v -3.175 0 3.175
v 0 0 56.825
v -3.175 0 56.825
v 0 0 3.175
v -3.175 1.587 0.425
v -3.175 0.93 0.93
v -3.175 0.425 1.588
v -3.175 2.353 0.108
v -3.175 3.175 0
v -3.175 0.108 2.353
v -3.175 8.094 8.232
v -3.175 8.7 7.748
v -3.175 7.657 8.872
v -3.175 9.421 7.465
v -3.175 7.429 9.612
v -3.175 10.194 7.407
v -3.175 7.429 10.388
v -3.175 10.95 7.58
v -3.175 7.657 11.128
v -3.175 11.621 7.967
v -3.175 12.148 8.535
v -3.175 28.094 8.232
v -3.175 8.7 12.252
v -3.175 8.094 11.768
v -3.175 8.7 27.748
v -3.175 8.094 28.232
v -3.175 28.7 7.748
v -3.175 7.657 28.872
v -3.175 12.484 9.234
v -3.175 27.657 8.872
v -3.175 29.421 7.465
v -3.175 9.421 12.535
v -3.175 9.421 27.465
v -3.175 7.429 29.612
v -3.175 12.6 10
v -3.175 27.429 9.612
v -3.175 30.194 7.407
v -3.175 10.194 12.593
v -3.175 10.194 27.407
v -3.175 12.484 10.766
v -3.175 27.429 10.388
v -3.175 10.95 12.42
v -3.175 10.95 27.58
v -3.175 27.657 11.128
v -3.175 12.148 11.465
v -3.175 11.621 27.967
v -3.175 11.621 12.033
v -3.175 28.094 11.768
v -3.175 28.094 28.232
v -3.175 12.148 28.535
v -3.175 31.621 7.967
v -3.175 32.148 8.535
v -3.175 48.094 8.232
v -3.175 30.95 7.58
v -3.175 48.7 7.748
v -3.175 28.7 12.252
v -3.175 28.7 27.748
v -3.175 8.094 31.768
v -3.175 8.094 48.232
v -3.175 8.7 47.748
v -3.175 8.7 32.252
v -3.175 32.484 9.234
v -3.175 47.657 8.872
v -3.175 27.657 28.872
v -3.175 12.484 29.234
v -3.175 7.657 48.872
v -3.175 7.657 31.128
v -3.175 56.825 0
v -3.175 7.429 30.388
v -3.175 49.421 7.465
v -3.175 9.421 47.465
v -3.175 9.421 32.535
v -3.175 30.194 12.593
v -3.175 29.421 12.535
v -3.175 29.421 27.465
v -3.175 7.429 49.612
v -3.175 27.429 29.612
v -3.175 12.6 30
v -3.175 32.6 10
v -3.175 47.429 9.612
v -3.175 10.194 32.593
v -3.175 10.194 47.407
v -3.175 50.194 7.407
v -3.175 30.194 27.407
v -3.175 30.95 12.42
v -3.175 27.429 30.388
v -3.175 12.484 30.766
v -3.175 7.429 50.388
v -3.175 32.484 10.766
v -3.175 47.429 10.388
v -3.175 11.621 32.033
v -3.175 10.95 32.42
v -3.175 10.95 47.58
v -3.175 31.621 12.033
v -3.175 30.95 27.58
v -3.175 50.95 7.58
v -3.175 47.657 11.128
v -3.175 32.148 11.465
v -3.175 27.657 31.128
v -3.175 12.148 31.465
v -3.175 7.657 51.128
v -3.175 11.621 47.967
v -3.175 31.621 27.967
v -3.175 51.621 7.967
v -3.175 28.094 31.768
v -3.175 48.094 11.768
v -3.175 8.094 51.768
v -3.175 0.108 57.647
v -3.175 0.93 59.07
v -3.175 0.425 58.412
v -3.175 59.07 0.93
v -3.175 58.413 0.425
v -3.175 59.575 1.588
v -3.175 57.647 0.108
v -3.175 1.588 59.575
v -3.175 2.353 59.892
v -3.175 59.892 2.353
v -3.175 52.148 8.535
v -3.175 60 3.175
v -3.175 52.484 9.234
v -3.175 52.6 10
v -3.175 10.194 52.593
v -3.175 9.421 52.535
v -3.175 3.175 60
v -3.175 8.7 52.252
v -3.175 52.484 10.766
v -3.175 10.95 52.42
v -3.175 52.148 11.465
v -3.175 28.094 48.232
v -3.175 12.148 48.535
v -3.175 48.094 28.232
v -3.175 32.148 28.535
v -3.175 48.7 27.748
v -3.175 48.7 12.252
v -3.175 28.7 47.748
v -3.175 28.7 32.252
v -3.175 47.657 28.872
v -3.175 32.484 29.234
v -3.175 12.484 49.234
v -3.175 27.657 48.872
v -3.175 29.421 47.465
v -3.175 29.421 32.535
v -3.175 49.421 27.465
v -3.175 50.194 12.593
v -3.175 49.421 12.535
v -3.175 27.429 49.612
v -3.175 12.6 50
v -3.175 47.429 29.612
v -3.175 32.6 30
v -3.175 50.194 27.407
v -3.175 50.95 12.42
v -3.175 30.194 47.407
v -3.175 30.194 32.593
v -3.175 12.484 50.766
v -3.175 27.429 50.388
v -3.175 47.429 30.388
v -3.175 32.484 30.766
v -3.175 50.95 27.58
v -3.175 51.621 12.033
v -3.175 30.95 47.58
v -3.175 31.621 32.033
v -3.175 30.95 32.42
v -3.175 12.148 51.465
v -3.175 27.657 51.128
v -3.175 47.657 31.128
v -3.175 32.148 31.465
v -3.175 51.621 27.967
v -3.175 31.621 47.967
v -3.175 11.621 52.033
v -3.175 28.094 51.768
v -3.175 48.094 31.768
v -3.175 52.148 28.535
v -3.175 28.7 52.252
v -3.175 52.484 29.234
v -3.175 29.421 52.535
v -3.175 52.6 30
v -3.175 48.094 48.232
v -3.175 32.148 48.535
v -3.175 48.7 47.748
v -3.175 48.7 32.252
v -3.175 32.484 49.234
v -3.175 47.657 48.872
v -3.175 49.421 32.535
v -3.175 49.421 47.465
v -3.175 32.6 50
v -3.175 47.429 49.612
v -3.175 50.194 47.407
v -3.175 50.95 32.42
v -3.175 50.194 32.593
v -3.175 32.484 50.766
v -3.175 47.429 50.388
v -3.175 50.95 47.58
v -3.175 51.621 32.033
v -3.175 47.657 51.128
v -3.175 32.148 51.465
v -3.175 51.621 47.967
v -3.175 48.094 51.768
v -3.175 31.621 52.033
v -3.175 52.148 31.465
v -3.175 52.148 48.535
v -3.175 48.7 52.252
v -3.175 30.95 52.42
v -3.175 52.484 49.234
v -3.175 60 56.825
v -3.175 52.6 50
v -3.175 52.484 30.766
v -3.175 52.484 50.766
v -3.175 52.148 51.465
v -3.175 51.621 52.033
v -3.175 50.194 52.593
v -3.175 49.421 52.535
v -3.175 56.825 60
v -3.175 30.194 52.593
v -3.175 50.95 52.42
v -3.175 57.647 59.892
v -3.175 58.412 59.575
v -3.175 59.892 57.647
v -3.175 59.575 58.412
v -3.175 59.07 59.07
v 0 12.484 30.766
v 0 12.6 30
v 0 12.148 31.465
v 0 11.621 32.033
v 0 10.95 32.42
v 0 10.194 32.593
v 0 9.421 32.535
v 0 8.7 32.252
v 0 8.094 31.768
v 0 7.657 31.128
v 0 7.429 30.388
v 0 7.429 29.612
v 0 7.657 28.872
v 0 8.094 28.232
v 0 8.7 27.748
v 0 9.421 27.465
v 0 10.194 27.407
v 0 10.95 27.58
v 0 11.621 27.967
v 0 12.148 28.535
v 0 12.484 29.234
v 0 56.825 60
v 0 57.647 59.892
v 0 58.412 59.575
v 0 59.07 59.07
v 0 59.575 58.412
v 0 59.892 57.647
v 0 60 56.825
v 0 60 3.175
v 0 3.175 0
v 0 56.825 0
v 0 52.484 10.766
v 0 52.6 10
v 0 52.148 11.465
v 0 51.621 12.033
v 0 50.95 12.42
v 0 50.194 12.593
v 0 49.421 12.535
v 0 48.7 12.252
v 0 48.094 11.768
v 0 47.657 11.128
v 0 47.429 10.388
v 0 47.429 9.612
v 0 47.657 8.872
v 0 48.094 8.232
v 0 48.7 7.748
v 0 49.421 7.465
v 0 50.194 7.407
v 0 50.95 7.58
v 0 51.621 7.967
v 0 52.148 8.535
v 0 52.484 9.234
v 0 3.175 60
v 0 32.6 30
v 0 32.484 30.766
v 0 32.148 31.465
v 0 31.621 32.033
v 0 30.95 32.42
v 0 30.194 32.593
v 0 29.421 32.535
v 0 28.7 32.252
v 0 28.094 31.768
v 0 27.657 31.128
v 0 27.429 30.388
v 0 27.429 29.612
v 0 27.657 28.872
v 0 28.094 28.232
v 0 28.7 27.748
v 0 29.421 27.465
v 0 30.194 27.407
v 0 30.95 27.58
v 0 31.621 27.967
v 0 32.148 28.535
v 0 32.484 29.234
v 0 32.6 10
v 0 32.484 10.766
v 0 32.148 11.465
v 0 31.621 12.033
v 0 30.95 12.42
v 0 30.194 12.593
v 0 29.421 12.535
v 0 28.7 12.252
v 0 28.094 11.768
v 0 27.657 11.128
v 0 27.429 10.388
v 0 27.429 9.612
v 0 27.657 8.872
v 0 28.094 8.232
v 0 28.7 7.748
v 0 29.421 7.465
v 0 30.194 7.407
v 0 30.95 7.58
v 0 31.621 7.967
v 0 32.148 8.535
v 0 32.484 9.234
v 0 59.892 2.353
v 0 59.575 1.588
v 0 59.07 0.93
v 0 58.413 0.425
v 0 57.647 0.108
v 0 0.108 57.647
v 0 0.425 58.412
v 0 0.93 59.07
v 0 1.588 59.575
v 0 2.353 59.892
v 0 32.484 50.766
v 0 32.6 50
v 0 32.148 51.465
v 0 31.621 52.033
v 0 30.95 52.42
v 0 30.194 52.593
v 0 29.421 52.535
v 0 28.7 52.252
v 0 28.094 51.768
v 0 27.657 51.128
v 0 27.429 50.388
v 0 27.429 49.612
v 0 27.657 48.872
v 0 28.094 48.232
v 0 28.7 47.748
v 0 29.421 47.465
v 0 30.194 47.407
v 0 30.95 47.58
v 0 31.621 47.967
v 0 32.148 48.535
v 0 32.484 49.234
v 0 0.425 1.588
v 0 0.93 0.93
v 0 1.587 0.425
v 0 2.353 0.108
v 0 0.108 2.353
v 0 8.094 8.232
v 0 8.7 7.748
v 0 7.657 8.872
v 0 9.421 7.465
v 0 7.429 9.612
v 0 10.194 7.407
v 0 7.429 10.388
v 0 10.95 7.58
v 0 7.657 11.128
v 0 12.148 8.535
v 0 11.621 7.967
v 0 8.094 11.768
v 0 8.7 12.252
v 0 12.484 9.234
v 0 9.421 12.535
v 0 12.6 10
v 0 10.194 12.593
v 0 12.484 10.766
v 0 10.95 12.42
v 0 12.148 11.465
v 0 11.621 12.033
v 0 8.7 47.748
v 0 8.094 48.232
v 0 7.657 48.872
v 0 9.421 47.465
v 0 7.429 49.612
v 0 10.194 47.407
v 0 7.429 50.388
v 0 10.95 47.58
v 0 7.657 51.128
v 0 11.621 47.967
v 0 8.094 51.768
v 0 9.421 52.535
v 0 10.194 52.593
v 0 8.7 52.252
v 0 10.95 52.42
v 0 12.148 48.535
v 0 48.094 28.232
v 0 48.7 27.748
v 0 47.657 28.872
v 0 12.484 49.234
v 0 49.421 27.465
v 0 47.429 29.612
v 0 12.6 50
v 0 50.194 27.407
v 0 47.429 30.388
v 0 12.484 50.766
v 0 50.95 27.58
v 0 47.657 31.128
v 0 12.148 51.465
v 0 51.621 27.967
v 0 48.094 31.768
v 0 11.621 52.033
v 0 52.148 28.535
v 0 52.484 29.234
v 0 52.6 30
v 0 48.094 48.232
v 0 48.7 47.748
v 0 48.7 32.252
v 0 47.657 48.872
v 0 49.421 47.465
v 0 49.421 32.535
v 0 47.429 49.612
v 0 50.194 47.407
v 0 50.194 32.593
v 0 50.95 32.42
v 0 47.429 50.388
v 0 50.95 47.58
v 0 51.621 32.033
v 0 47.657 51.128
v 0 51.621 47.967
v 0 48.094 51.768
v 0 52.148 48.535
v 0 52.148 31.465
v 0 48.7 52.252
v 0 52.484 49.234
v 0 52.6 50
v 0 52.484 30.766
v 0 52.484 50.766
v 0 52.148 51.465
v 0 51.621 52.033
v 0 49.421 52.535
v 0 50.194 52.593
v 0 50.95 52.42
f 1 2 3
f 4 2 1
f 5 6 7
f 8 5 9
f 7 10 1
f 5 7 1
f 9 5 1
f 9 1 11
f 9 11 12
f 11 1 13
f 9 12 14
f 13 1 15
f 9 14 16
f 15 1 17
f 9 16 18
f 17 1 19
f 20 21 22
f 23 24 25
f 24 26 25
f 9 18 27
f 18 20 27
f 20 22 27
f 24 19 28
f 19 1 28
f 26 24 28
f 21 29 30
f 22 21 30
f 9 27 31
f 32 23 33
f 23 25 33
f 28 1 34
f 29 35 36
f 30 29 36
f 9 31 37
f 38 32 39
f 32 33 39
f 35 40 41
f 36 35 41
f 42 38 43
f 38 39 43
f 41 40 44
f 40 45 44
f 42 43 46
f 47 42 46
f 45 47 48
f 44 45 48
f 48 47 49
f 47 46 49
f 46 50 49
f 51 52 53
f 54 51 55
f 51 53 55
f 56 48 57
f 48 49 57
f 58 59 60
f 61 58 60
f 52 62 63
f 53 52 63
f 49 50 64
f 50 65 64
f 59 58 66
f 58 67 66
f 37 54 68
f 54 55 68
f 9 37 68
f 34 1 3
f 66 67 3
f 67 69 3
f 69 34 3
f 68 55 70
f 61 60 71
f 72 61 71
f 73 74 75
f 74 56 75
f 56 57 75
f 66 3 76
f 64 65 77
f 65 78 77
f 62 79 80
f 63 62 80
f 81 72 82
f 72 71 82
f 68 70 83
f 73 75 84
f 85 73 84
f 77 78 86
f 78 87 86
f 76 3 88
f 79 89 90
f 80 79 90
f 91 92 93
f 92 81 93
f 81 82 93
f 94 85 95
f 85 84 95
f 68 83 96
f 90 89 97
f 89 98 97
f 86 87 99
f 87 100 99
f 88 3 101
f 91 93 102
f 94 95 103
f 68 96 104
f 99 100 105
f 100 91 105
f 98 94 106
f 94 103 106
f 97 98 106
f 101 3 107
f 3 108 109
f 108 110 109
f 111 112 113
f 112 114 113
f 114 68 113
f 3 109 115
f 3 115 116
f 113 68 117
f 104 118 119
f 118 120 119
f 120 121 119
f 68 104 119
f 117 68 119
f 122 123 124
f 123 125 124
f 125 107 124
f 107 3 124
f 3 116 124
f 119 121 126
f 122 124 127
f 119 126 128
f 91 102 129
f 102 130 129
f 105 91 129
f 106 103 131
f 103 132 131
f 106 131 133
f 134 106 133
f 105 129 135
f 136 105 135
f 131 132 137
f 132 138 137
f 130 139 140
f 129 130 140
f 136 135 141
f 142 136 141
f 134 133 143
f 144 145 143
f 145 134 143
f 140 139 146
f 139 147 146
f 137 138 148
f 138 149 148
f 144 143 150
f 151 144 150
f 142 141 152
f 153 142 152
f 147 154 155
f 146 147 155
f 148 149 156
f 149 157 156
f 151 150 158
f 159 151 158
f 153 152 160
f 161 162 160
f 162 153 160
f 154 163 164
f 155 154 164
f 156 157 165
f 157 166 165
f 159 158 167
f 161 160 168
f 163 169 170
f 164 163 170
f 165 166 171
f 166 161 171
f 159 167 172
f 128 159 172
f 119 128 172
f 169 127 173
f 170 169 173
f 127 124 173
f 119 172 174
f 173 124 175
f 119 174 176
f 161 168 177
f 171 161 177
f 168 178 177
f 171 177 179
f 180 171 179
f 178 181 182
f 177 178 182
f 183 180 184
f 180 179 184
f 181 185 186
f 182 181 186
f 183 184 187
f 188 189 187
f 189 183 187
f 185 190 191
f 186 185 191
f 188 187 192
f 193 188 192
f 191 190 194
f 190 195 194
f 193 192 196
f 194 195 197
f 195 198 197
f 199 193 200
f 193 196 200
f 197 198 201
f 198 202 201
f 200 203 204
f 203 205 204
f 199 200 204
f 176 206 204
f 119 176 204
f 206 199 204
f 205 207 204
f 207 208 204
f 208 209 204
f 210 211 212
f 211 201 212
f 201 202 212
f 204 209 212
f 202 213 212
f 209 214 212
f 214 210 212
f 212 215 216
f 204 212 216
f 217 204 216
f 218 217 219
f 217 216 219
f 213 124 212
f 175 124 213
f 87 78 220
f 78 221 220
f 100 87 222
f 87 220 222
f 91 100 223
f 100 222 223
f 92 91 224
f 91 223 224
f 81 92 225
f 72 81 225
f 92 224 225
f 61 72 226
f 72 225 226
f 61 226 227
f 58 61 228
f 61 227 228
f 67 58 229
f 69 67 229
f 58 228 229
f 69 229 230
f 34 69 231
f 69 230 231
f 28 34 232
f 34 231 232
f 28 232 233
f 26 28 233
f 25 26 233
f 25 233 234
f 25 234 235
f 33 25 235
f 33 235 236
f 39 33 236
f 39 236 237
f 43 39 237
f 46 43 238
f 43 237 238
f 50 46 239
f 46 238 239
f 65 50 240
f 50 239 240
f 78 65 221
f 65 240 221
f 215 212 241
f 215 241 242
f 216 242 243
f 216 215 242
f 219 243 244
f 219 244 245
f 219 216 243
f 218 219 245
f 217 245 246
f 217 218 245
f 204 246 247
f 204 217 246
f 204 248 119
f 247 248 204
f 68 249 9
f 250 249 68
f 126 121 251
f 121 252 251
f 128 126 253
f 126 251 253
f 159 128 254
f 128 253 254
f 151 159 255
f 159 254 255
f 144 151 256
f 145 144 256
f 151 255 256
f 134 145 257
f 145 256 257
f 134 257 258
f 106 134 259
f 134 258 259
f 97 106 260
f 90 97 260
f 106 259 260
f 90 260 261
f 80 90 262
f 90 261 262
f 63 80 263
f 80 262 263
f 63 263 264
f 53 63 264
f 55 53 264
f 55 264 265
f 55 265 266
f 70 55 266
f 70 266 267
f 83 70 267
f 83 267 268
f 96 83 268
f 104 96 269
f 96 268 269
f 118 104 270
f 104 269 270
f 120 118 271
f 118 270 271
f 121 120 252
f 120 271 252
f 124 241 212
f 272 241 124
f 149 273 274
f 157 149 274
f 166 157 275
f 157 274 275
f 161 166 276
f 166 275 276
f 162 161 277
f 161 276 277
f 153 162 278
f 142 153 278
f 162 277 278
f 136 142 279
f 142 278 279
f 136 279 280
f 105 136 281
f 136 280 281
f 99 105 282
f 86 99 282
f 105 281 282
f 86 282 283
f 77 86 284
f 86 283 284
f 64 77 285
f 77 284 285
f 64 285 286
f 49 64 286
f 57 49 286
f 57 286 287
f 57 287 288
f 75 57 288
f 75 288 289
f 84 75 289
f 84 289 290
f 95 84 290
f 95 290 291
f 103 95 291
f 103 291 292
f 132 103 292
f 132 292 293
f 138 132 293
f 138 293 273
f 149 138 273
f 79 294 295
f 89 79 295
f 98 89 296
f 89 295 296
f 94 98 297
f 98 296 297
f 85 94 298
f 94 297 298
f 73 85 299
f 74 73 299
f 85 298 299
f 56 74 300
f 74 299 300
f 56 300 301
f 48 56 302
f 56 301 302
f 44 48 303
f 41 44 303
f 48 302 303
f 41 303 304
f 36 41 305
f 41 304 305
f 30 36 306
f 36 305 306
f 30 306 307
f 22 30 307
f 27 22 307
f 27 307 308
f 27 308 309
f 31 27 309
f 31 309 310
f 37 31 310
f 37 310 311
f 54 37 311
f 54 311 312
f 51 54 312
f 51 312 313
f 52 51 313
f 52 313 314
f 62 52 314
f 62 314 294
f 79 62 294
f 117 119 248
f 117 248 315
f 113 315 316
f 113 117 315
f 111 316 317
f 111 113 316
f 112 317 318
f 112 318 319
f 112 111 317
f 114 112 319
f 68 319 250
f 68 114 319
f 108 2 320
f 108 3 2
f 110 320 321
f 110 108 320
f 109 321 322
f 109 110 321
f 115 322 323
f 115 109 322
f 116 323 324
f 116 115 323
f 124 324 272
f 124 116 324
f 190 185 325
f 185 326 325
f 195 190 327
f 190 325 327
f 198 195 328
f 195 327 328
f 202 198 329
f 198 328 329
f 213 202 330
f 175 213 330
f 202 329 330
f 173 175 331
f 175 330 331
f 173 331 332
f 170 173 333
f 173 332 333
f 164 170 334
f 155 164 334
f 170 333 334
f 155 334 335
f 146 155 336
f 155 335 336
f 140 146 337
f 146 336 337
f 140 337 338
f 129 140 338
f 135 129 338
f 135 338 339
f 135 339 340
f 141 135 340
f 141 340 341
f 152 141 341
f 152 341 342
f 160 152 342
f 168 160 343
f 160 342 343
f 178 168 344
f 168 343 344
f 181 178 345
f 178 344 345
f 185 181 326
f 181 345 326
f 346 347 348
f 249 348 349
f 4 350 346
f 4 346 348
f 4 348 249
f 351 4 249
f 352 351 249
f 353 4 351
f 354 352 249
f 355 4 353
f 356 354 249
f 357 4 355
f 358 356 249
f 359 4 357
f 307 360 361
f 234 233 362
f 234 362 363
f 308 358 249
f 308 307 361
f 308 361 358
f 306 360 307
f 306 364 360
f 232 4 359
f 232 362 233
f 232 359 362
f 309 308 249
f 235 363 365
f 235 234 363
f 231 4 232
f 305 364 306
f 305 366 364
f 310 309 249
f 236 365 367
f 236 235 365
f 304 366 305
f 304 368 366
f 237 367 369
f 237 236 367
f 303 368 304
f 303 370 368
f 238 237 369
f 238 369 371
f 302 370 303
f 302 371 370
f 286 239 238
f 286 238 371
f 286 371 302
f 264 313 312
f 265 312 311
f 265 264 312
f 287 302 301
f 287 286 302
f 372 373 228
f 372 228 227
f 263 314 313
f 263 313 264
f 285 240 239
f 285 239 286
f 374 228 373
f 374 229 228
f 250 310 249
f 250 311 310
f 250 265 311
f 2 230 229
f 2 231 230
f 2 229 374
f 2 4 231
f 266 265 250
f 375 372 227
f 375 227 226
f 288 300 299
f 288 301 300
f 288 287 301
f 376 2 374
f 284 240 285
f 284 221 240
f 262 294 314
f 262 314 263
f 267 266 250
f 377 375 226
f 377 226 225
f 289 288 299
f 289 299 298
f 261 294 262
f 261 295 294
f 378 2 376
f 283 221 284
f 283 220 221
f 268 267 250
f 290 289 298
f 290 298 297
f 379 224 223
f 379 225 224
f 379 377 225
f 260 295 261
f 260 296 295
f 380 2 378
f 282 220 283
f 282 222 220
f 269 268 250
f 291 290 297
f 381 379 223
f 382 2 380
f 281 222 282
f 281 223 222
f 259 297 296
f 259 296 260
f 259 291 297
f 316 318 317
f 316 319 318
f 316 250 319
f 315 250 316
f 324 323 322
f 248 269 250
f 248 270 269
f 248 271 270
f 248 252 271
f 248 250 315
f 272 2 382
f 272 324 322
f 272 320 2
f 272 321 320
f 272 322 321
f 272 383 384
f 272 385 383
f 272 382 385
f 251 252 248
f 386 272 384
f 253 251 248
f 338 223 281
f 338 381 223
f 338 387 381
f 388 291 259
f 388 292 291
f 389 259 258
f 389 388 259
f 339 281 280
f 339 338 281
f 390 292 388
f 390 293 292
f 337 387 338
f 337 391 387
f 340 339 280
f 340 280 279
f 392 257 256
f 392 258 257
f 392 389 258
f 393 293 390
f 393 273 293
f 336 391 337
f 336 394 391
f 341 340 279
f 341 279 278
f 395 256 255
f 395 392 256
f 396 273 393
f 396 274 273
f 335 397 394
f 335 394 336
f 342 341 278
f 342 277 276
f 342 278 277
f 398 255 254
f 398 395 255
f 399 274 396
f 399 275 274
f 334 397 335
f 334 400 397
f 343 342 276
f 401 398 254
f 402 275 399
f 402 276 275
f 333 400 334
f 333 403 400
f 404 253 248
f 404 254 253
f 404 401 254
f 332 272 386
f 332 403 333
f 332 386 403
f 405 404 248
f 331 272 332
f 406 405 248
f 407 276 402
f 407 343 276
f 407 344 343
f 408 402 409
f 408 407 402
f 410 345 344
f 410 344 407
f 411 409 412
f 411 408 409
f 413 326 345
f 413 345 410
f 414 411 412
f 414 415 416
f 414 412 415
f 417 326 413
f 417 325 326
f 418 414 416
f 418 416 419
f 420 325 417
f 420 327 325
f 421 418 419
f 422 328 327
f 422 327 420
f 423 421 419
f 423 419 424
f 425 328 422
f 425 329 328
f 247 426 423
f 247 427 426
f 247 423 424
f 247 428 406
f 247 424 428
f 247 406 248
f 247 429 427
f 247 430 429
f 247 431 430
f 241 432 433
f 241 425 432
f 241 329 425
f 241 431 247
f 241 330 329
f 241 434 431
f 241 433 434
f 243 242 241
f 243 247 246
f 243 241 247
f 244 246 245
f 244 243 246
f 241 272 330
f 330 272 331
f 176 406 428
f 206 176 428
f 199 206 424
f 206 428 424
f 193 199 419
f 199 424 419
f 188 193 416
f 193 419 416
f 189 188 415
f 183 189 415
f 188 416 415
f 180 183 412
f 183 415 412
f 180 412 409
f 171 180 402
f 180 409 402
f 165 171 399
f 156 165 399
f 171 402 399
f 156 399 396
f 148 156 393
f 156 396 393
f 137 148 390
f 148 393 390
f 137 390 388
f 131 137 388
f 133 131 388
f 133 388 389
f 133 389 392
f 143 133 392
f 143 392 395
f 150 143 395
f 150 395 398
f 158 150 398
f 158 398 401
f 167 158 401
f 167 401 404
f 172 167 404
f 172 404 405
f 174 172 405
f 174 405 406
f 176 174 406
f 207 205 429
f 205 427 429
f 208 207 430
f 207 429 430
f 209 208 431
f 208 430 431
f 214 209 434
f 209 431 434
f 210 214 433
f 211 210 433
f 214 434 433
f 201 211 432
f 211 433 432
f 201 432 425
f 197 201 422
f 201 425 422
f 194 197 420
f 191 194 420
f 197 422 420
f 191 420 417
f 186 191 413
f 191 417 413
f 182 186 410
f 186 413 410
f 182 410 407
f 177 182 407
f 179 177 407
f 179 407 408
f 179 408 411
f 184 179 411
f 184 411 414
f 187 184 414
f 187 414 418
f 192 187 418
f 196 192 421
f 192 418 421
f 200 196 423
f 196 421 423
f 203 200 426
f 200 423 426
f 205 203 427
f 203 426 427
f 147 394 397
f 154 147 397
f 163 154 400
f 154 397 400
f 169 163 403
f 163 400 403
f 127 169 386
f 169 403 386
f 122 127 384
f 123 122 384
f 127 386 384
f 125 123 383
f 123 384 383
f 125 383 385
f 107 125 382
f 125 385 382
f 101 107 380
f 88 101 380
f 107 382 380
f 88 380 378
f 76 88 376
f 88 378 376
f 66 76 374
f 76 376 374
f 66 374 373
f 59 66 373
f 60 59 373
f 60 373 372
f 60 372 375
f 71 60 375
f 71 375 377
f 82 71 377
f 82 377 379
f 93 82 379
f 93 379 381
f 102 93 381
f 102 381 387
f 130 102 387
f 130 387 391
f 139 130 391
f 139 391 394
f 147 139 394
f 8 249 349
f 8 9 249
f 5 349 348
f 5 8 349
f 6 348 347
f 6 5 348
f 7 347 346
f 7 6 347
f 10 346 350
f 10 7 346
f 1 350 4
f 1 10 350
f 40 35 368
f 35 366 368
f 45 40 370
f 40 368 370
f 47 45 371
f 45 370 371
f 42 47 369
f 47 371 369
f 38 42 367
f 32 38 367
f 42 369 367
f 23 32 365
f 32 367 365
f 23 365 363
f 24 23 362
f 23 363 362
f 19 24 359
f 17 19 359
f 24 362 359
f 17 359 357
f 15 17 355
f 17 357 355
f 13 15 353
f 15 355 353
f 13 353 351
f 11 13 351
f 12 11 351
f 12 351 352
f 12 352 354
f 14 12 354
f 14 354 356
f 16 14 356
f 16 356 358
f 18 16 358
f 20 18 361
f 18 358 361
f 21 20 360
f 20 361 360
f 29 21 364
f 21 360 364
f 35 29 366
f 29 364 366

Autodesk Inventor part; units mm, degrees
ref_plane "YZ Plane" through (0, 0, 0) normal (1, 0, 0) x (0, 1, 0)
ref_plane "XZ Plane" through (0, 0, 0) normal (0, 1, 0) x (-1, 0, 0)
ref_plane "XY Plane" through (0, 0, 0) normal (0, 0, 1) x (1, 0, 0)
sketch "Sketch1" plane through (0, 0, 0) normal (1, 0, 0) x (0, 1, 0)
  line L0 (0, 0) -> (60, 0)
  line L1 (60, 0) -> (60, 60)
  line L2 (60, 60) -> (0, 60)
  line L3 (0, 60) -> (0, 0)
  line L4 (60, 60) -> (40, 60) construction
  line L5 (40, 60) -> (40, 40) construction
  line L6 (40, 40) -> (60, 40) construction
  line L7 (60, 40) -> (60, 60) construction
  line L8 (40, 40) -> (60, 40) construction
  line L9 (60, 40) -> (60, 20) construction
  line L10 (60, 20) -> (40, 20) construction
  line L11 (40, 20) -> (40, 40) construction
  line L12 (40, 20) -> (60, 20) construction
  line L13 (60, 20) -> (60, 0) construction
  line L14 (60, 0) -> (40, 0) construction
  line L15 (40, 0) -> (40, 20) construction
  line L16 (40, 20) -> (20, 20) construction
  line L17 (20, 20) -> (20, 0) construction
  line L18 (20, 0) -> (40, 0) construction
  line L19 (40, 0) -> (40, 20) construction
  line L20 (20, 20) -> (40, 20) construction
  line L21 (40, 20) -> (40, 40) construction
  line L22 (40, 40) -> (20, 40) construction
  line L23 (20, 40) -> (20, 20) construction
  line L24 (40, 40) -> (20, 40) construction
  line L25 (20, 40) -> (20, 60) construction
  line L26 (20, 60) -> (40, 60) construction
  line L27 (40, 60) -> (40, 40) construction
  line L28 (20, 60) -> (0, 60) construction
  line L29 (0, 60) -> (0, 40) construction
  line L30 (0, 40) -> (20, 40) construction
  line L31 (20, 40) -> (20, 60) construction
  line L32 (0, 40) -> (20, 40) construction
  line L33 (20, 40) -> (20, 20) construction
  line L34 (20, 20) -> (0, 20) construction
  line L35 (0, 20) -> (0, 40) construction
  line L36 (20, 20) -> (0, 20) construction
  line L37 (0, 20) -> (0, 0) construction
  line L38 (0, 0) -> (20, 0) construction
  line L39 (20, 0) -> (20, 20) construction
  line L40 (60, 10) -> (0, 10) construction
  line L41 (60, 30) -> (0, 30) construction
  line L42 (60, 50) -> (0, 50) construction
  line L43 (50, 60) -> (50, 0) construction
  line L44 (30, 60) -> (30, 0) construction
  line L45 (10, 60) -> (10, 0) construction
  circle A0 centre (50, 50) radius 2.6
  circle A1 centre (50, 30) radius 2.6
  circle A2 centre (50, 10) radius 2.6
  circle A3 centre (30, 10) radius 2.6
  circle A4 centre (30, 30) radius 2.6
  circle A5 centre (30, 50) radius 2.6
  circle A6 centre (10, 50) radius 2.6
  circle A7 centre (10, 30) radius 2.6
  circle A8 centre (10, 10) radius 2.6
  dimension "d0" = 60
  dimension "d1" = 60
  dimension "d2" = 20
  dimension "d3" = 20
  dimension "d4" = 20
  dimension "d5" = 20
  dimension "d6" = 20
  dimension "d7" = 20
  dimension "d8" = 20
  dimension "d9" = 20
  dimension "d10" = 5.2
  dimension "d11" = 5.2
  dimension "d12" = 5.2
  dimension "d13" = 5.2
  dimension "d14" = 5.2
  dimension "d15" = 5.2
  dimension "d16" = 5.2
  dimension "d17" = 5.2
  dimension "d18" = 5.2
extrude "Extrusion1" add sketch "Sketch1" against normal blind 3.175
fillet "Fillet1" radius 3.175 4 edges at (-1.5875, 60, 60) (-1.5875, 0, 60) (-1.5875, 0, 0) (-1.5875, 60, 0)
equation "\"d11\" = d10"
equation "\"d12\" = d10"
equation "\"d13\" = d10"
equation "\"d14\" = d10"
equation "\"d15\" = d10"
equation "\"d16\" = d10"
equation "\"d17\" = d10"
equation "\"d18\" = d10"
properties part number "Generic 3x3 Corner Connecting Gusset"
